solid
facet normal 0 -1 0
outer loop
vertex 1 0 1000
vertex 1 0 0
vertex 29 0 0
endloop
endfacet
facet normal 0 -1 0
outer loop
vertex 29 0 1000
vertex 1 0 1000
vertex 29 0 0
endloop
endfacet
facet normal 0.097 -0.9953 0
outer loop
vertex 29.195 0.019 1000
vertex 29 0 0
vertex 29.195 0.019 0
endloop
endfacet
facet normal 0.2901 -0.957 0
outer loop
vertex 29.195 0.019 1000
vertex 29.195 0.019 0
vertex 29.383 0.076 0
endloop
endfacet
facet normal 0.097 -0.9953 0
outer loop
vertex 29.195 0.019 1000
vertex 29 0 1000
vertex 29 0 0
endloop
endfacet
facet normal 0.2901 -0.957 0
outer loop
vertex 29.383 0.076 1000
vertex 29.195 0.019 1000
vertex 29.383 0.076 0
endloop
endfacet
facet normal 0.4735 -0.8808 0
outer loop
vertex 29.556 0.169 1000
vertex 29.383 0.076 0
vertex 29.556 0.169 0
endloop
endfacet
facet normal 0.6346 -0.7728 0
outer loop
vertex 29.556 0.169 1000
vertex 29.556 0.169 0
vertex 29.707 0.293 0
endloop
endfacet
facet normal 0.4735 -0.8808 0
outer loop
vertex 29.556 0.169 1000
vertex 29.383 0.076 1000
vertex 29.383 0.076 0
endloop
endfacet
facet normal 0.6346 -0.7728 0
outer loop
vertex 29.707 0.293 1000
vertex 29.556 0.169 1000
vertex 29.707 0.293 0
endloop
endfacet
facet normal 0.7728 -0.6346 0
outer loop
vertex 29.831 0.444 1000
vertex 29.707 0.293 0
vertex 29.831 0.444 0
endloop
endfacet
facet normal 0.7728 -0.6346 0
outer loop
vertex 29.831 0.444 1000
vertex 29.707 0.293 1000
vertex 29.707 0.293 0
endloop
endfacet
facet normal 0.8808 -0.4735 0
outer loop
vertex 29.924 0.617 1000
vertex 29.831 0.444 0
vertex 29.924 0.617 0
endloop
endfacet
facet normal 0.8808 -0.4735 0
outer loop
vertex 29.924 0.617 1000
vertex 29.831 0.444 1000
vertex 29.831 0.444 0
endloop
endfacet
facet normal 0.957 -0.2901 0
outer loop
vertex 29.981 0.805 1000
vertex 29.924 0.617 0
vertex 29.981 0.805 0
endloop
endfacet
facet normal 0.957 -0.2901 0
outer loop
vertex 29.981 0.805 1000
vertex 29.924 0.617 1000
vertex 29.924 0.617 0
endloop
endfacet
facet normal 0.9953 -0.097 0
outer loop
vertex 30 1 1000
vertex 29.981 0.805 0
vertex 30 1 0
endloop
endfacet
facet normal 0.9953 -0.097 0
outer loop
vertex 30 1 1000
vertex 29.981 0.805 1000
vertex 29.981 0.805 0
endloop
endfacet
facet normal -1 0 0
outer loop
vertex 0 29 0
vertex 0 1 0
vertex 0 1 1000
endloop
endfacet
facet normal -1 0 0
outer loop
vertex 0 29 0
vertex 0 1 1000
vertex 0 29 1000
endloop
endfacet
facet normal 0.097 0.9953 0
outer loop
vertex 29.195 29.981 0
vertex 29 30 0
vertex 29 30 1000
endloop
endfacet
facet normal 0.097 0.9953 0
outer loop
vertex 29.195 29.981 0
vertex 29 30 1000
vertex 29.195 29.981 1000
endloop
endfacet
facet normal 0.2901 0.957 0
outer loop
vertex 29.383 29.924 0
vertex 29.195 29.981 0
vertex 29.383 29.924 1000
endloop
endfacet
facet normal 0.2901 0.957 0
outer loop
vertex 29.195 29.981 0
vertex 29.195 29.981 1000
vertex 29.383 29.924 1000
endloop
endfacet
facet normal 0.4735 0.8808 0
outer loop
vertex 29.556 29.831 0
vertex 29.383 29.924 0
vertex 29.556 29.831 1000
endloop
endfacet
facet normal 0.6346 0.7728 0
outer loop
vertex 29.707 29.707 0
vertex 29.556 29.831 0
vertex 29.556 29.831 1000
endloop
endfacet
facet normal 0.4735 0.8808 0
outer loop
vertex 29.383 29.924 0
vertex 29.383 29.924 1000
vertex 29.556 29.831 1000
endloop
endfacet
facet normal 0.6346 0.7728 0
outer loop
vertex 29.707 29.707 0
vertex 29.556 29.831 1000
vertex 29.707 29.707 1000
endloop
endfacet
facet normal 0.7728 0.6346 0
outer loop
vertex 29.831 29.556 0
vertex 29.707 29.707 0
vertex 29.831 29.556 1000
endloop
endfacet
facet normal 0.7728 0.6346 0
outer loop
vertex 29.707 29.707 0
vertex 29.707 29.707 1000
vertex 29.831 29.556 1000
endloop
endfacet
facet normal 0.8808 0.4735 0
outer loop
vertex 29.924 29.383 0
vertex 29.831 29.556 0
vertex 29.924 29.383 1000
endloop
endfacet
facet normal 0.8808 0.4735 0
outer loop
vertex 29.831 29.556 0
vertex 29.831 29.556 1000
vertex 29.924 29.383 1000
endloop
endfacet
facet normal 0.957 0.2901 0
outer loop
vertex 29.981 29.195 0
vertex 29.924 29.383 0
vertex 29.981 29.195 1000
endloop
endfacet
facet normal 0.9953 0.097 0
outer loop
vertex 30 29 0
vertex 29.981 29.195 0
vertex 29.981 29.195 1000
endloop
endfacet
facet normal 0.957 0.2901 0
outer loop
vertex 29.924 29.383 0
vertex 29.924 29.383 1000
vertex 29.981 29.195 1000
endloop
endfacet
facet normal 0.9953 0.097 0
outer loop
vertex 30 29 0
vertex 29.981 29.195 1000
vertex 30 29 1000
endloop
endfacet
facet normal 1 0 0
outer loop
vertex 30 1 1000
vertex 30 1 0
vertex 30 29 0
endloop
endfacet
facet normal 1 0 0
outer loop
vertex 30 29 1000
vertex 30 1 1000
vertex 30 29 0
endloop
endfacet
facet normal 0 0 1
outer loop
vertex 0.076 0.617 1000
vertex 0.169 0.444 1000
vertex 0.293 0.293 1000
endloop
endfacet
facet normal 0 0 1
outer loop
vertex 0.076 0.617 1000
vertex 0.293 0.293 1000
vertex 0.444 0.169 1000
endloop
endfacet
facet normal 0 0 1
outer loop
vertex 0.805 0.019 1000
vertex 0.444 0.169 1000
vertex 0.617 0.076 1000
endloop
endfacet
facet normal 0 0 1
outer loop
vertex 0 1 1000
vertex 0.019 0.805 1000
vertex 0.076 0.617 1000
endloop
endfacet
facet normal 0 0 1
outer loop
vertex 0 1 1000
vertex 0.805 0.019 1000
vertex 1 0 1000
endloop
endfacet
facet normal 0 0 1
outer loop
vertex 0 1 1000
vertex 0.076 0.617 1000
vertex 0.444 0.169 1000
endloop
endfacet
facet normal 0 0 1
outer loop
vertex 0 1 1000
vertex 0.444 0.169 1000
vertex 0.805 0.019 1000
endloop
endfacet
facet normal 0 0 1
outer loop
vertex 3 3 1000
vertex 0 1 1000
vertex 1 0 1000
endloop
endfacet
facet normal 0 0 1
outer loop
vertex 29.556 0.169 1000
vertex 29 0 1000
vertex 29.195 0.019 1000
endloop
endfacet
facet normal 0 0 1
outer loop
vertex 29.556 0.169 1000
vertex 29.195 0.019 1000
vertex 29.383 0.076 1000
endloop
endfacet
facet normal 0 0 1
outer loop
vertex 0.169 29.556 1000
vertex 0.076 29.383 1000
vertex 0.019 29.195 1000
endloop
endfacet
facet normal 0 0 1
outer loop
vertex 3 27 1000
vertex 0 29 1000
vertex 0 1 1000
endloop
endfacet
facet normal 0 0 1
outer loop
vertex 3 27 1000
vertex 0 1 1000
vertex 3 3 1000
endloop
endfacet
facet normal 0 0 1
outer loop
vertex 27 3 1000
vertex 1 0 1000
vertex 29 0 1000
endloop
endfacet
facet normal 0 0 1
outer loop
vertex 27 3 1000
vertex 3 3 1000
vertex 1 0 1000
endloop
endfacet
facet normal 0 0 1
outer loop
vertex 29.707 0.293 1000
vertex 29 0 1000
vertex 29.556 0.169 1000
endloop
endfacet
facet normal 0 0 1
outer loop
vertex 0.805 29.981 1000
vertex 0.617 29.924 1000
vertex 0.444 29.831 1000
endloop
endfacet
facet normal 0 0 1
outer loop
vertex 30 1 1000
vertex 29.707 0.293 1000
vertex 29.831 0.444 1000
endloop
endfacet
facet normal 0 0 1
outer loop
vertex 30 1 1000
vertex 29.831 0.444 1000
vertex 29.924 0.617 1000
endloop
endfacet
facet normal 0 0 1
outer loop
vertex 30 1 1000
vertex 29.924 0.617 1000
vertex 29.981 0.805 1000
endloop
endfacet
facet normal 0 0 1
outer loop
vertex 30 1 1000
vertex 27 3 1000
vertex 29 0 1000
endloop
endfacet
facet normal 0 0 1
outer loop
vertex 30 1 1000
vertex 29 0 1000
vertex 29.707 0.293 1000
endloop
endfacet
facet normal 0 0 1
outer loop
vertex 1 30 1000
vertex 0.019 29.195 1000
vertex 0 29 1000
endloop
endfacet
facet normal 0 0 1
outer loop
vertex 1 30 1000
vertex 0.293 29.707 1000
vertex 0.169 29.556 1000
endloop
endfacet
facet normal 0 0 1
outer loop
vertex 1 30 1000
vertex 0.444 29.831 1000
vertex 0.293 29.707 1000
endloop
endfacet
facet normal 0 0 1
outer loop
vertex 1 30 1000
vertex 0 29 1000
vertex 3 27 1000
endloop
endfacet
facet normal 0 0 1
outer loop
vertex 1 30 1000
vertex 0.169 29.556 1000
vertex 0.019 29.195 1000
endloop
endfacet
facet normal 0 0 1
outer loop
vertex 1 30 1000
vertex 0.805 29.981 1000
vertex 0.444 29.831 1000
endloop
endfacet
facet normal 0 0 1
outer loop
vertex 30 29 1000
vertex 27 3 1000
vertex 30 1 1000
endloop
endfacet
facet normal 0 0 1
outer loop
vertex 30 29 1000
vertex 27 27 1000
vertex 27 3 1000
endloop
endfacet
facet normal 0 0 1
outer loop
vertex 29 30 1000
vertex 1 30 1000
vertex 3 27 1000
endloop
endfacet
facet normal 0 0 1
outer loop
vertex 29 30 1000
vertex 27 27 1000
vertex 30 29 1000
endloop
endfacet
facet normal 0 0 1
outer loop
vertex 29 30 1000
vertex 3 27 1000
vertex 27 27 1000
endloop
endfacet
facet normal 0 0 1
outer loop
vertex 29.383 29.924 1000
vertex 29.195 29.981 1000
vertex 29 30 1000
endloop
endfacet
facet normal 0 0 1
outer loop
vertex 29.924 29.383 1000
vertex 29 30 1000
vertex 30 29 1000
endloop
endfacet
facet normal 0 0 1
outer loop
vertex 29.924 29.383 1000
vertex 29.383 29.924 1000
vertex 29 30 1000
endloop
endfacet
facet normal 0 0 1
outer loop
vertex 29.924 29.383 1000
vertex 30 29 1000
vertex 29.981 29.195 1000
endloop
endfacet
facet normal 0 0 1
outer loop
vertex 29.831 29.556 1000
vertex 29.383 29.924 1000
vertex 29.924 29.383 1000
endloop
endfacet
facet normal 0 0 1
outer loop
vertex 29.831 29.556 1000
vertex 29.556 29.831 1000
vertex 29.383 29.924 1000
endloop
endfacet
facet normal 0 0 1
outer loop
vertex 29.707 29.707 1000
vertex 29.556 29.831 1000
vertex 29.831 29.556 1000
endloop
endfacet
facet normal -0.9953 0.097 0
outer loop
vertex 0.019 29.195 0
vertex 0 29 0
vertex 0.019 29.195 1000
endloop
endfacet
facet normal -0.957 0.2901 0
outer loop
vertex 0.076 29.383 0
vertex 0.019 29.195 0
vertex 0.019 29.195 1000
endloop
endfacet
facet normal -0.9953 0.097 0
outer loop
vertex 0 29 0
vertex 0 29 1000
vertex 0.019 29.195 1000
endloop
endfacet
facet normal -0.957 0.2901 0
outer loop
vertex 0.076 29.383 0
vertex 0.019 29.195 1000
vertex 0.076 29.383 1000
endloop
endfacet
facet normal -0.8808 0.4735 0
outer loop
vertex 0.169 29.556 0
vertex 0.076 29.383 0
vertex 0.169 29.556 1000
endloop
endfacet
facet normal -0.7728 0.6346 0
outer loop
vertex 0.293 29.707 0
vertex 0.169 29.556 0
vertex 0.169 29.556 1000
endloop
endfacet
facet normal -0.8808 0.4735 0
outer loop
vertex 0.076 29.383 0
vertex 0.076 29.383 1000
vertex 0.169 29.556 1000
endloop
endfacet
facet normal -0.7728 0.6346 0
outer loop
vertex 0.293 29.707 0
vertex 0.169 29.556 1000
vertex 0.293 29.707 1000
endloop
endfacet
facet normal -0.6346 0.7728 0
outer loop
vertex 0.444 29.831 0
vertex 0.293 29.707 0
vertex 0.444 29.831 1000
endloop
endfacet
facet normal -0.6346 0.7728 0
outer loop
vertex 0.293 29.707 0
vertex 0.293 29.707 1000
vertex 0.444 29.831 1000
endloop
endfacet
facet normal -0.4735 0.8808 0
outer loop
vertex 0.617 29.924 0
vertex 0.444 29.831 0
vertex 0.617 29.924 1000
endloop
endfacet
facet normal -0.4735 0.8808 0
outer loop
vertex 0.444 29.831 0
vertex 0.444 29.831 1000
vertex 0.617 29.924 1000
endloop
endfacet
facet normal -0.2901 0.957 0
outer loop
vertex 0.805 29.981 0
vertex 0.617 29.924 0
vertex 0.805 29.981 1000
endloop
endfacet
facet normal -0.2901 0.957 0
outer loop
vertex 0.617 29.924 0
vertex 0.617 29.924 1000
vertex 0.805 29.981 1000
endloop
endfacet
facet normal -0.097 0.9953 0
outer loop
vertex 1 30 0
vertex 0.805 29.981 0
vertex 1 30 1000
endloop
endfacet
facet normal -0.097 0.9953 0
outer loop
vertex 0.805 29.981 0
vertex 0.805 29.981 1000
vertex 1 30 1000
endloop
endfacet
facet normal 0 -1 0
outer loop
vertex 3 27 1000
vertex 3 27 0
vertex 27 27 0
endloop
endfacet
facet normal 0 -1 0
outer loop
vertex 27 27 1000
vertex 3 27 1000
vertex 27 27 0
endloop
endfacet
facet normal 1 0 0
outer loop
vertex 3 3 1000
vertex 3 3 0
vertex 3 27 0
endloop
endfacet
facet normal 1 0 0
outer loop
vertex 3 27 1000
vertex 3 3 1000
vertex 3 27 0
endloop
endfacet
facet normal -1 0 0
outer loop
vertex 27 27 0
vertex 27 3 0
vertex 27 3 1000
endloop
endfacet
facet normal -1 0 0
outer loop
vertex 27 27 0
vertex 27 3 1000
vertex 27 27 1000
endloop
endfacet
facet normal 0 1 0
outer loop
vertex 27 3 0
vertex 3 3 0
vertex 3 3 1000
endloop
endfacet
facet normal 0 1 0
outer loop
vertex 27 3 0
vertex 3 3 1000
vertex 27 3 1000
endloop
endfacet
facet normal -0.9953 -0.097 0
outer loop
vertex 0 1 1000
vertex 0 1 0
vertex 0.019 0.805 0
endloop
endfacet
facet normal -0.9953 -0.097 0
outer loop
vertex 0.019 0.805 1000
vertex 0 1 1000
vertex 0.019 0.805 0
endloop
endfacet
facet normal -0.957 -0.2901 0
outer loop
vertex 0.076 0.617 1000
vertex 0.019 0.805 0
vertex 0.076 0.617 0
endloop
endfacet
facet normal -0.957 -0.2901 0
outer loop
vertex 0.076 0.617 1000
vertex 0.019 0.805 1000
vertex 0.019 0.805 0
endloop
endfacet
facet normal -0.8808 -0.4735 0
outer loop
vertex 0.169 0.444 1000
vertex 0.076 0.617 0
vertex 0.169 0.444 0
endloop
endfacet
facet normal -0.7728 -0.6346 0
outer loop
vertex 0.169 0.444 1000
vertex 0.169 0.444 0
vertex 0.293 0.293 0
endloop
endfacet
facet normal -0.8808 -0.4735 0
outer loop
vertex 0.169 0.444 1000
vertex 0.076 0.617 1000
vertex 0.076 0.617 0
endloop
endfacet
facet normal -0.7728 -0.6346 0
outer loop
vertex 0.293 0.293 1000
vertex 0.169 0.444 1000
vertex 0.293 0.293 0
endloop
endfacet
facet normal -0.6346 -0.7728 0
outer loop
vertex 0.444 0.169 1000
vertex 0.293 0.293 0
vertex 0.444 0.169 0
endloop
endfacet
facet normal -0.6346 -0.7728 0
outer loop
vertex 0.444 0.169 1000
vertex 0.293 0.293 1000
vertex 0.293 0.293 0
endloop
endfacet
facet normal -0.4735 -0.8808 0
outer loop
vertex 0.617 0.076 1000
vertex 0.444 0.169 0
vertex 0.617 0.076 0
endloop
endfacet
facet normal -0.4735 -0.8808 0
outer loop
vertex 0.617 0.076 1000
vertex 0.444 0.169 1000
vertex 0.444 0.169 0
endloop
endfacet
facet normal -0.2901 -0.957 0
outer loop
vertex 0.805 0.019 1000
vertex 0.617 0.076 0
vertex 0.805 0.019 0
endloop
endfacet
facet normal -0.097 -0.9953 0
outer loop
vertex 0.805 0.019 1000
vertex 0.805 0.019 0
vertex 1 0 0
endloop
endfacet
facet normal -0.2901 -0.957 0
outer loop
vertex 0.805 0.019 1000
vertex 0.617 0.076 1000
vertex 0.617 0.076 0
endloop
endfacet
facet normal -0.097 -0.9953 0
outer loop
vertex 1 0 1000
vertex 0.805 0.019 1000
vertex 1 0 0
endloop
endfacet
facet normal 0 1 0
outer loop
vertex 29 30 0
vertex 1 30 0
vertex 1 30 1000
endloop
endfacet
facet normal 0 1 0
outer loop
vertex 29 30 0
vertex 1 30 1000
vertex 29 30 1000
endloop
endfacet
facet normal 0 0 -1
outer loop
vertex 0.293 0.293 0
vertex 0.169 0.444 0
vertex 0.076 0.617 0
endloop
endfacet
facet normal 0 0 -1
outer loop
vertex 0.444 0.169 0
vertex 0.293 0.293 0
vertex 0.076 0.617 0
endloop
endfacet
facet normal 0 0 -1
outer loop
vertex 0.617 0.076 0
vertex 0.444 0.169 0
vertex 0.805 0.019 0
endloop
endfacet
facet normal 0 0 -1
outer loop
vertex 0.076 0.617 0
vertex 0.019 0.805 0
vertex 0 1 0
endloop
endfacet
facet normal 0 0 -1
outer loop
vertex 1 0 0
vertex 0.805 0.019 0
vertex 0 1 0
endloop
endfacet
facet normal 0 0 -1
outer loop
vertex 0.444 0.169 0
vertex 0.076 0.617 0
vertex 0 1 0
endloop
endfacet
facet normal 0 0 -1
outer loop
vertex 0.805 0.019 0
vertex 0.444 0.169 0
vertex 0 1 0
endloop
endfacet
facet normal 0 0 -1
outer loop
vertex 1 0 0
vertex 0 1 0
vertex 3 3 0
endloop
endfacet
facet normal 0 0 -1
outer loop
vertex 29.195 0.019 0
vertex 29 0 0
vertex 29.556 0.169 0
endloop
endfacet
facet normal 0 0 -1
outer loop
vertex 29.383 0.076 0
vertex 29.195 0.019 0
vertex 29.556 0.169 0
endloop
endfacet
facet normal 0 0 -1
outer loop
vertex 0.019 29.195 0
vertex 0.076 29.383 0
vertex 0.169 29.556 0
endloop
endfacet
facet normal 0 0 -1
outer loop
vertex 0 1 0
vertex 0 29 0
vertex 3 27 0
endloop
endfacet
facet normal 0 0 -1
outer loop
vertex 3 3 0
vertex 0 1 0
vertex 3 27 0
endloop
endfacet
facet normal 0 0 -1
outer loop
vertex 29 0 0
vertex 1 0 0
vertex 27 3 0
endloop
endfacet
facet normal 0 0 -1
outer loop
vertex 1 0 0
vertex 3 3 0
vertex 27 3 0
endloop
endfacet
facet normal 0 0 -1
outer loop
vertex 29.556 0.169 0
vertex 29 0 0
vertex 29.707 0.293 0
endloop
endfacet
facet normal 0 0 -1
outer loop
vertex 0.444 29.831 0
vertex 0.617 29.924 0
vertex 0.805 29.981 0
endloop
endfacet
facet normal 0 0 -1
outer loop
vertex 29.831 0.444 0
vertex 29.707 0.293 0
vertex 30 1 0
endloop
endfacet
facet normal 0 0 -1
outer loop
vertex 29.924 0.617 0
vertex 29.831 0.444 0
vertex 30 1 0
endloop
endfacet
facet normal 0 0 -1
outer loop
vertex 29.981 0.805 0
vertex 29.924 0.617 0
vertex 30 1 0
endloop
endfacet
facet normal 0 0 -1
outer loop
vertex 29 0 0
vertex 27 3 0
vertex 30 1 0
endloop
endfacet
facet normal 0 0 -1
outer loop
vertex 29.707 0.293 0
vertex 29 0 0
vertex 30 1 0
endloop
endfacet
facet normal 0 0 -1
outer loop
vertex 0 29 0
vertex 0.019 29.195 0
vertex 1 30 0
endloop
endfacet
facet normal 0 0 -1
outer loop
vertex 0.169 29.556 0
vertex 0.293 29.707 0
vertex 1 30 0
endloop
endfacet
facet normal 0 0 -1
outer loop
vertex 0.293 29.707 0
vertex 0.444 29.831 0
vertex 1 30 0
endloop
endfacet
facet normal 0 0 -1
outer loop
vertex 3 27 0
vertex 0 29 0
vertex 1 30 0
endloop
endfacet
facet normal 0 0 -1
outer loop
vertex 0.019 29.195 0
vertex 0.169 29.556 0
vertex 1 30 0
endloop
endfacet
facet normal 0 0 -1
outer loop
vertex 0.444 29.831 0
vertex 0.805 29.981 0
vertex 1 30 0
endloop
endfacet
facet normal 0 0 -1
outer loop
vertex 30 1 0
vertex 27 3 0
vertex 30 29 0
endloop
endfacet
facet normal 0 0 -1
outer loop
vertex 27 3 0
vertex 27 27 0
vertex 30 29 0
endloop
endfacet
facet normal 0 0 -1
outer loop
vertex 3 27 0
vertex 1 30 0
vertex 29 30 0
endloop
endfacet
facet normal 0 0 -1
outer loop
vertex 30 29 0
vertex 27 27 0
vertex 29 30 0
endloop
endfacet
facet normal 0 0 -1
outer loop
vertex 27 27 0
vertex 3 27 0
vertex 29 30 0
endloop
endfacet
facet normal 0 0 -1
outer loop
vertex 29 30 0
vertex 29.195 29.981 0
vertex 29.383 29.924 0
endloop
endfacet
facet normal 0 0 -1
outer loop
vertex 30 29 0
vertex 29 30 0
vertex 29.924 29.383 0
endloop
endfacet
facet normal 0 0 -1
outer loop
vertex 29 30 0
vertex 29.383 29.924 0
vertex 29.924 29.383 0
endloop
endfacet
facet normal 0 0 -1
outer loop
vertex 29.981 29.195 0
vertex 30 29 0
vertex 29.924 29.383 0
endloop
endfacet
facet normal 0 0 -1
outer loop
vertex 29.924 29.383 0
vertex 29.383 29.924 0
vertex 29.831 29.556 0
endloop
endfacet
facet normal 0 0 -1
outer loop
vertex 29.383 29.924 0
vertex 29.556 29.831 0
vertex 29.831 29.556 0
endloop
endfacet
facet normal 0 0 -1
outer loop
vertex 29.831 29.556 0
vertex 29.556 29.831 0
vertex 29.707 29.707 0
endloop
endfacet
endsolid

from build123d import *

# Parameters (mm, degrees)
SKETCH_W   = 30
SKETCH_H   = 30
SKETCH_W_2 = 24
SKETCH_H_2 = 24
PAD_DEPTH  = 1000
FILLET_R   = 1


with BuildPart() as part:
    # Sketch → Pad (new body)
    with BuildSketch(Plane.XY):
        with Locations((15, 15)):
            Rectangle(SKETCH_W, SKETCH_H)
        with Locations((15, 15)):
            Rectangle(SKETCH_W_2, SKETCH_H_2, mode=Mode.SUBTRACT)
    extrude(amount=PAD_DEPTH)

    # Fillet
    fillet_edges = [part.edges().sort_by_distance(p)[0] for p in [
        (30, 0, 500),
        (0, 0, 500),
        (0, 30, 500),
        (30, 30, 500),
    ]]
    fillet(fillet_edges, radius=FILLET_R)


solid = part.part
